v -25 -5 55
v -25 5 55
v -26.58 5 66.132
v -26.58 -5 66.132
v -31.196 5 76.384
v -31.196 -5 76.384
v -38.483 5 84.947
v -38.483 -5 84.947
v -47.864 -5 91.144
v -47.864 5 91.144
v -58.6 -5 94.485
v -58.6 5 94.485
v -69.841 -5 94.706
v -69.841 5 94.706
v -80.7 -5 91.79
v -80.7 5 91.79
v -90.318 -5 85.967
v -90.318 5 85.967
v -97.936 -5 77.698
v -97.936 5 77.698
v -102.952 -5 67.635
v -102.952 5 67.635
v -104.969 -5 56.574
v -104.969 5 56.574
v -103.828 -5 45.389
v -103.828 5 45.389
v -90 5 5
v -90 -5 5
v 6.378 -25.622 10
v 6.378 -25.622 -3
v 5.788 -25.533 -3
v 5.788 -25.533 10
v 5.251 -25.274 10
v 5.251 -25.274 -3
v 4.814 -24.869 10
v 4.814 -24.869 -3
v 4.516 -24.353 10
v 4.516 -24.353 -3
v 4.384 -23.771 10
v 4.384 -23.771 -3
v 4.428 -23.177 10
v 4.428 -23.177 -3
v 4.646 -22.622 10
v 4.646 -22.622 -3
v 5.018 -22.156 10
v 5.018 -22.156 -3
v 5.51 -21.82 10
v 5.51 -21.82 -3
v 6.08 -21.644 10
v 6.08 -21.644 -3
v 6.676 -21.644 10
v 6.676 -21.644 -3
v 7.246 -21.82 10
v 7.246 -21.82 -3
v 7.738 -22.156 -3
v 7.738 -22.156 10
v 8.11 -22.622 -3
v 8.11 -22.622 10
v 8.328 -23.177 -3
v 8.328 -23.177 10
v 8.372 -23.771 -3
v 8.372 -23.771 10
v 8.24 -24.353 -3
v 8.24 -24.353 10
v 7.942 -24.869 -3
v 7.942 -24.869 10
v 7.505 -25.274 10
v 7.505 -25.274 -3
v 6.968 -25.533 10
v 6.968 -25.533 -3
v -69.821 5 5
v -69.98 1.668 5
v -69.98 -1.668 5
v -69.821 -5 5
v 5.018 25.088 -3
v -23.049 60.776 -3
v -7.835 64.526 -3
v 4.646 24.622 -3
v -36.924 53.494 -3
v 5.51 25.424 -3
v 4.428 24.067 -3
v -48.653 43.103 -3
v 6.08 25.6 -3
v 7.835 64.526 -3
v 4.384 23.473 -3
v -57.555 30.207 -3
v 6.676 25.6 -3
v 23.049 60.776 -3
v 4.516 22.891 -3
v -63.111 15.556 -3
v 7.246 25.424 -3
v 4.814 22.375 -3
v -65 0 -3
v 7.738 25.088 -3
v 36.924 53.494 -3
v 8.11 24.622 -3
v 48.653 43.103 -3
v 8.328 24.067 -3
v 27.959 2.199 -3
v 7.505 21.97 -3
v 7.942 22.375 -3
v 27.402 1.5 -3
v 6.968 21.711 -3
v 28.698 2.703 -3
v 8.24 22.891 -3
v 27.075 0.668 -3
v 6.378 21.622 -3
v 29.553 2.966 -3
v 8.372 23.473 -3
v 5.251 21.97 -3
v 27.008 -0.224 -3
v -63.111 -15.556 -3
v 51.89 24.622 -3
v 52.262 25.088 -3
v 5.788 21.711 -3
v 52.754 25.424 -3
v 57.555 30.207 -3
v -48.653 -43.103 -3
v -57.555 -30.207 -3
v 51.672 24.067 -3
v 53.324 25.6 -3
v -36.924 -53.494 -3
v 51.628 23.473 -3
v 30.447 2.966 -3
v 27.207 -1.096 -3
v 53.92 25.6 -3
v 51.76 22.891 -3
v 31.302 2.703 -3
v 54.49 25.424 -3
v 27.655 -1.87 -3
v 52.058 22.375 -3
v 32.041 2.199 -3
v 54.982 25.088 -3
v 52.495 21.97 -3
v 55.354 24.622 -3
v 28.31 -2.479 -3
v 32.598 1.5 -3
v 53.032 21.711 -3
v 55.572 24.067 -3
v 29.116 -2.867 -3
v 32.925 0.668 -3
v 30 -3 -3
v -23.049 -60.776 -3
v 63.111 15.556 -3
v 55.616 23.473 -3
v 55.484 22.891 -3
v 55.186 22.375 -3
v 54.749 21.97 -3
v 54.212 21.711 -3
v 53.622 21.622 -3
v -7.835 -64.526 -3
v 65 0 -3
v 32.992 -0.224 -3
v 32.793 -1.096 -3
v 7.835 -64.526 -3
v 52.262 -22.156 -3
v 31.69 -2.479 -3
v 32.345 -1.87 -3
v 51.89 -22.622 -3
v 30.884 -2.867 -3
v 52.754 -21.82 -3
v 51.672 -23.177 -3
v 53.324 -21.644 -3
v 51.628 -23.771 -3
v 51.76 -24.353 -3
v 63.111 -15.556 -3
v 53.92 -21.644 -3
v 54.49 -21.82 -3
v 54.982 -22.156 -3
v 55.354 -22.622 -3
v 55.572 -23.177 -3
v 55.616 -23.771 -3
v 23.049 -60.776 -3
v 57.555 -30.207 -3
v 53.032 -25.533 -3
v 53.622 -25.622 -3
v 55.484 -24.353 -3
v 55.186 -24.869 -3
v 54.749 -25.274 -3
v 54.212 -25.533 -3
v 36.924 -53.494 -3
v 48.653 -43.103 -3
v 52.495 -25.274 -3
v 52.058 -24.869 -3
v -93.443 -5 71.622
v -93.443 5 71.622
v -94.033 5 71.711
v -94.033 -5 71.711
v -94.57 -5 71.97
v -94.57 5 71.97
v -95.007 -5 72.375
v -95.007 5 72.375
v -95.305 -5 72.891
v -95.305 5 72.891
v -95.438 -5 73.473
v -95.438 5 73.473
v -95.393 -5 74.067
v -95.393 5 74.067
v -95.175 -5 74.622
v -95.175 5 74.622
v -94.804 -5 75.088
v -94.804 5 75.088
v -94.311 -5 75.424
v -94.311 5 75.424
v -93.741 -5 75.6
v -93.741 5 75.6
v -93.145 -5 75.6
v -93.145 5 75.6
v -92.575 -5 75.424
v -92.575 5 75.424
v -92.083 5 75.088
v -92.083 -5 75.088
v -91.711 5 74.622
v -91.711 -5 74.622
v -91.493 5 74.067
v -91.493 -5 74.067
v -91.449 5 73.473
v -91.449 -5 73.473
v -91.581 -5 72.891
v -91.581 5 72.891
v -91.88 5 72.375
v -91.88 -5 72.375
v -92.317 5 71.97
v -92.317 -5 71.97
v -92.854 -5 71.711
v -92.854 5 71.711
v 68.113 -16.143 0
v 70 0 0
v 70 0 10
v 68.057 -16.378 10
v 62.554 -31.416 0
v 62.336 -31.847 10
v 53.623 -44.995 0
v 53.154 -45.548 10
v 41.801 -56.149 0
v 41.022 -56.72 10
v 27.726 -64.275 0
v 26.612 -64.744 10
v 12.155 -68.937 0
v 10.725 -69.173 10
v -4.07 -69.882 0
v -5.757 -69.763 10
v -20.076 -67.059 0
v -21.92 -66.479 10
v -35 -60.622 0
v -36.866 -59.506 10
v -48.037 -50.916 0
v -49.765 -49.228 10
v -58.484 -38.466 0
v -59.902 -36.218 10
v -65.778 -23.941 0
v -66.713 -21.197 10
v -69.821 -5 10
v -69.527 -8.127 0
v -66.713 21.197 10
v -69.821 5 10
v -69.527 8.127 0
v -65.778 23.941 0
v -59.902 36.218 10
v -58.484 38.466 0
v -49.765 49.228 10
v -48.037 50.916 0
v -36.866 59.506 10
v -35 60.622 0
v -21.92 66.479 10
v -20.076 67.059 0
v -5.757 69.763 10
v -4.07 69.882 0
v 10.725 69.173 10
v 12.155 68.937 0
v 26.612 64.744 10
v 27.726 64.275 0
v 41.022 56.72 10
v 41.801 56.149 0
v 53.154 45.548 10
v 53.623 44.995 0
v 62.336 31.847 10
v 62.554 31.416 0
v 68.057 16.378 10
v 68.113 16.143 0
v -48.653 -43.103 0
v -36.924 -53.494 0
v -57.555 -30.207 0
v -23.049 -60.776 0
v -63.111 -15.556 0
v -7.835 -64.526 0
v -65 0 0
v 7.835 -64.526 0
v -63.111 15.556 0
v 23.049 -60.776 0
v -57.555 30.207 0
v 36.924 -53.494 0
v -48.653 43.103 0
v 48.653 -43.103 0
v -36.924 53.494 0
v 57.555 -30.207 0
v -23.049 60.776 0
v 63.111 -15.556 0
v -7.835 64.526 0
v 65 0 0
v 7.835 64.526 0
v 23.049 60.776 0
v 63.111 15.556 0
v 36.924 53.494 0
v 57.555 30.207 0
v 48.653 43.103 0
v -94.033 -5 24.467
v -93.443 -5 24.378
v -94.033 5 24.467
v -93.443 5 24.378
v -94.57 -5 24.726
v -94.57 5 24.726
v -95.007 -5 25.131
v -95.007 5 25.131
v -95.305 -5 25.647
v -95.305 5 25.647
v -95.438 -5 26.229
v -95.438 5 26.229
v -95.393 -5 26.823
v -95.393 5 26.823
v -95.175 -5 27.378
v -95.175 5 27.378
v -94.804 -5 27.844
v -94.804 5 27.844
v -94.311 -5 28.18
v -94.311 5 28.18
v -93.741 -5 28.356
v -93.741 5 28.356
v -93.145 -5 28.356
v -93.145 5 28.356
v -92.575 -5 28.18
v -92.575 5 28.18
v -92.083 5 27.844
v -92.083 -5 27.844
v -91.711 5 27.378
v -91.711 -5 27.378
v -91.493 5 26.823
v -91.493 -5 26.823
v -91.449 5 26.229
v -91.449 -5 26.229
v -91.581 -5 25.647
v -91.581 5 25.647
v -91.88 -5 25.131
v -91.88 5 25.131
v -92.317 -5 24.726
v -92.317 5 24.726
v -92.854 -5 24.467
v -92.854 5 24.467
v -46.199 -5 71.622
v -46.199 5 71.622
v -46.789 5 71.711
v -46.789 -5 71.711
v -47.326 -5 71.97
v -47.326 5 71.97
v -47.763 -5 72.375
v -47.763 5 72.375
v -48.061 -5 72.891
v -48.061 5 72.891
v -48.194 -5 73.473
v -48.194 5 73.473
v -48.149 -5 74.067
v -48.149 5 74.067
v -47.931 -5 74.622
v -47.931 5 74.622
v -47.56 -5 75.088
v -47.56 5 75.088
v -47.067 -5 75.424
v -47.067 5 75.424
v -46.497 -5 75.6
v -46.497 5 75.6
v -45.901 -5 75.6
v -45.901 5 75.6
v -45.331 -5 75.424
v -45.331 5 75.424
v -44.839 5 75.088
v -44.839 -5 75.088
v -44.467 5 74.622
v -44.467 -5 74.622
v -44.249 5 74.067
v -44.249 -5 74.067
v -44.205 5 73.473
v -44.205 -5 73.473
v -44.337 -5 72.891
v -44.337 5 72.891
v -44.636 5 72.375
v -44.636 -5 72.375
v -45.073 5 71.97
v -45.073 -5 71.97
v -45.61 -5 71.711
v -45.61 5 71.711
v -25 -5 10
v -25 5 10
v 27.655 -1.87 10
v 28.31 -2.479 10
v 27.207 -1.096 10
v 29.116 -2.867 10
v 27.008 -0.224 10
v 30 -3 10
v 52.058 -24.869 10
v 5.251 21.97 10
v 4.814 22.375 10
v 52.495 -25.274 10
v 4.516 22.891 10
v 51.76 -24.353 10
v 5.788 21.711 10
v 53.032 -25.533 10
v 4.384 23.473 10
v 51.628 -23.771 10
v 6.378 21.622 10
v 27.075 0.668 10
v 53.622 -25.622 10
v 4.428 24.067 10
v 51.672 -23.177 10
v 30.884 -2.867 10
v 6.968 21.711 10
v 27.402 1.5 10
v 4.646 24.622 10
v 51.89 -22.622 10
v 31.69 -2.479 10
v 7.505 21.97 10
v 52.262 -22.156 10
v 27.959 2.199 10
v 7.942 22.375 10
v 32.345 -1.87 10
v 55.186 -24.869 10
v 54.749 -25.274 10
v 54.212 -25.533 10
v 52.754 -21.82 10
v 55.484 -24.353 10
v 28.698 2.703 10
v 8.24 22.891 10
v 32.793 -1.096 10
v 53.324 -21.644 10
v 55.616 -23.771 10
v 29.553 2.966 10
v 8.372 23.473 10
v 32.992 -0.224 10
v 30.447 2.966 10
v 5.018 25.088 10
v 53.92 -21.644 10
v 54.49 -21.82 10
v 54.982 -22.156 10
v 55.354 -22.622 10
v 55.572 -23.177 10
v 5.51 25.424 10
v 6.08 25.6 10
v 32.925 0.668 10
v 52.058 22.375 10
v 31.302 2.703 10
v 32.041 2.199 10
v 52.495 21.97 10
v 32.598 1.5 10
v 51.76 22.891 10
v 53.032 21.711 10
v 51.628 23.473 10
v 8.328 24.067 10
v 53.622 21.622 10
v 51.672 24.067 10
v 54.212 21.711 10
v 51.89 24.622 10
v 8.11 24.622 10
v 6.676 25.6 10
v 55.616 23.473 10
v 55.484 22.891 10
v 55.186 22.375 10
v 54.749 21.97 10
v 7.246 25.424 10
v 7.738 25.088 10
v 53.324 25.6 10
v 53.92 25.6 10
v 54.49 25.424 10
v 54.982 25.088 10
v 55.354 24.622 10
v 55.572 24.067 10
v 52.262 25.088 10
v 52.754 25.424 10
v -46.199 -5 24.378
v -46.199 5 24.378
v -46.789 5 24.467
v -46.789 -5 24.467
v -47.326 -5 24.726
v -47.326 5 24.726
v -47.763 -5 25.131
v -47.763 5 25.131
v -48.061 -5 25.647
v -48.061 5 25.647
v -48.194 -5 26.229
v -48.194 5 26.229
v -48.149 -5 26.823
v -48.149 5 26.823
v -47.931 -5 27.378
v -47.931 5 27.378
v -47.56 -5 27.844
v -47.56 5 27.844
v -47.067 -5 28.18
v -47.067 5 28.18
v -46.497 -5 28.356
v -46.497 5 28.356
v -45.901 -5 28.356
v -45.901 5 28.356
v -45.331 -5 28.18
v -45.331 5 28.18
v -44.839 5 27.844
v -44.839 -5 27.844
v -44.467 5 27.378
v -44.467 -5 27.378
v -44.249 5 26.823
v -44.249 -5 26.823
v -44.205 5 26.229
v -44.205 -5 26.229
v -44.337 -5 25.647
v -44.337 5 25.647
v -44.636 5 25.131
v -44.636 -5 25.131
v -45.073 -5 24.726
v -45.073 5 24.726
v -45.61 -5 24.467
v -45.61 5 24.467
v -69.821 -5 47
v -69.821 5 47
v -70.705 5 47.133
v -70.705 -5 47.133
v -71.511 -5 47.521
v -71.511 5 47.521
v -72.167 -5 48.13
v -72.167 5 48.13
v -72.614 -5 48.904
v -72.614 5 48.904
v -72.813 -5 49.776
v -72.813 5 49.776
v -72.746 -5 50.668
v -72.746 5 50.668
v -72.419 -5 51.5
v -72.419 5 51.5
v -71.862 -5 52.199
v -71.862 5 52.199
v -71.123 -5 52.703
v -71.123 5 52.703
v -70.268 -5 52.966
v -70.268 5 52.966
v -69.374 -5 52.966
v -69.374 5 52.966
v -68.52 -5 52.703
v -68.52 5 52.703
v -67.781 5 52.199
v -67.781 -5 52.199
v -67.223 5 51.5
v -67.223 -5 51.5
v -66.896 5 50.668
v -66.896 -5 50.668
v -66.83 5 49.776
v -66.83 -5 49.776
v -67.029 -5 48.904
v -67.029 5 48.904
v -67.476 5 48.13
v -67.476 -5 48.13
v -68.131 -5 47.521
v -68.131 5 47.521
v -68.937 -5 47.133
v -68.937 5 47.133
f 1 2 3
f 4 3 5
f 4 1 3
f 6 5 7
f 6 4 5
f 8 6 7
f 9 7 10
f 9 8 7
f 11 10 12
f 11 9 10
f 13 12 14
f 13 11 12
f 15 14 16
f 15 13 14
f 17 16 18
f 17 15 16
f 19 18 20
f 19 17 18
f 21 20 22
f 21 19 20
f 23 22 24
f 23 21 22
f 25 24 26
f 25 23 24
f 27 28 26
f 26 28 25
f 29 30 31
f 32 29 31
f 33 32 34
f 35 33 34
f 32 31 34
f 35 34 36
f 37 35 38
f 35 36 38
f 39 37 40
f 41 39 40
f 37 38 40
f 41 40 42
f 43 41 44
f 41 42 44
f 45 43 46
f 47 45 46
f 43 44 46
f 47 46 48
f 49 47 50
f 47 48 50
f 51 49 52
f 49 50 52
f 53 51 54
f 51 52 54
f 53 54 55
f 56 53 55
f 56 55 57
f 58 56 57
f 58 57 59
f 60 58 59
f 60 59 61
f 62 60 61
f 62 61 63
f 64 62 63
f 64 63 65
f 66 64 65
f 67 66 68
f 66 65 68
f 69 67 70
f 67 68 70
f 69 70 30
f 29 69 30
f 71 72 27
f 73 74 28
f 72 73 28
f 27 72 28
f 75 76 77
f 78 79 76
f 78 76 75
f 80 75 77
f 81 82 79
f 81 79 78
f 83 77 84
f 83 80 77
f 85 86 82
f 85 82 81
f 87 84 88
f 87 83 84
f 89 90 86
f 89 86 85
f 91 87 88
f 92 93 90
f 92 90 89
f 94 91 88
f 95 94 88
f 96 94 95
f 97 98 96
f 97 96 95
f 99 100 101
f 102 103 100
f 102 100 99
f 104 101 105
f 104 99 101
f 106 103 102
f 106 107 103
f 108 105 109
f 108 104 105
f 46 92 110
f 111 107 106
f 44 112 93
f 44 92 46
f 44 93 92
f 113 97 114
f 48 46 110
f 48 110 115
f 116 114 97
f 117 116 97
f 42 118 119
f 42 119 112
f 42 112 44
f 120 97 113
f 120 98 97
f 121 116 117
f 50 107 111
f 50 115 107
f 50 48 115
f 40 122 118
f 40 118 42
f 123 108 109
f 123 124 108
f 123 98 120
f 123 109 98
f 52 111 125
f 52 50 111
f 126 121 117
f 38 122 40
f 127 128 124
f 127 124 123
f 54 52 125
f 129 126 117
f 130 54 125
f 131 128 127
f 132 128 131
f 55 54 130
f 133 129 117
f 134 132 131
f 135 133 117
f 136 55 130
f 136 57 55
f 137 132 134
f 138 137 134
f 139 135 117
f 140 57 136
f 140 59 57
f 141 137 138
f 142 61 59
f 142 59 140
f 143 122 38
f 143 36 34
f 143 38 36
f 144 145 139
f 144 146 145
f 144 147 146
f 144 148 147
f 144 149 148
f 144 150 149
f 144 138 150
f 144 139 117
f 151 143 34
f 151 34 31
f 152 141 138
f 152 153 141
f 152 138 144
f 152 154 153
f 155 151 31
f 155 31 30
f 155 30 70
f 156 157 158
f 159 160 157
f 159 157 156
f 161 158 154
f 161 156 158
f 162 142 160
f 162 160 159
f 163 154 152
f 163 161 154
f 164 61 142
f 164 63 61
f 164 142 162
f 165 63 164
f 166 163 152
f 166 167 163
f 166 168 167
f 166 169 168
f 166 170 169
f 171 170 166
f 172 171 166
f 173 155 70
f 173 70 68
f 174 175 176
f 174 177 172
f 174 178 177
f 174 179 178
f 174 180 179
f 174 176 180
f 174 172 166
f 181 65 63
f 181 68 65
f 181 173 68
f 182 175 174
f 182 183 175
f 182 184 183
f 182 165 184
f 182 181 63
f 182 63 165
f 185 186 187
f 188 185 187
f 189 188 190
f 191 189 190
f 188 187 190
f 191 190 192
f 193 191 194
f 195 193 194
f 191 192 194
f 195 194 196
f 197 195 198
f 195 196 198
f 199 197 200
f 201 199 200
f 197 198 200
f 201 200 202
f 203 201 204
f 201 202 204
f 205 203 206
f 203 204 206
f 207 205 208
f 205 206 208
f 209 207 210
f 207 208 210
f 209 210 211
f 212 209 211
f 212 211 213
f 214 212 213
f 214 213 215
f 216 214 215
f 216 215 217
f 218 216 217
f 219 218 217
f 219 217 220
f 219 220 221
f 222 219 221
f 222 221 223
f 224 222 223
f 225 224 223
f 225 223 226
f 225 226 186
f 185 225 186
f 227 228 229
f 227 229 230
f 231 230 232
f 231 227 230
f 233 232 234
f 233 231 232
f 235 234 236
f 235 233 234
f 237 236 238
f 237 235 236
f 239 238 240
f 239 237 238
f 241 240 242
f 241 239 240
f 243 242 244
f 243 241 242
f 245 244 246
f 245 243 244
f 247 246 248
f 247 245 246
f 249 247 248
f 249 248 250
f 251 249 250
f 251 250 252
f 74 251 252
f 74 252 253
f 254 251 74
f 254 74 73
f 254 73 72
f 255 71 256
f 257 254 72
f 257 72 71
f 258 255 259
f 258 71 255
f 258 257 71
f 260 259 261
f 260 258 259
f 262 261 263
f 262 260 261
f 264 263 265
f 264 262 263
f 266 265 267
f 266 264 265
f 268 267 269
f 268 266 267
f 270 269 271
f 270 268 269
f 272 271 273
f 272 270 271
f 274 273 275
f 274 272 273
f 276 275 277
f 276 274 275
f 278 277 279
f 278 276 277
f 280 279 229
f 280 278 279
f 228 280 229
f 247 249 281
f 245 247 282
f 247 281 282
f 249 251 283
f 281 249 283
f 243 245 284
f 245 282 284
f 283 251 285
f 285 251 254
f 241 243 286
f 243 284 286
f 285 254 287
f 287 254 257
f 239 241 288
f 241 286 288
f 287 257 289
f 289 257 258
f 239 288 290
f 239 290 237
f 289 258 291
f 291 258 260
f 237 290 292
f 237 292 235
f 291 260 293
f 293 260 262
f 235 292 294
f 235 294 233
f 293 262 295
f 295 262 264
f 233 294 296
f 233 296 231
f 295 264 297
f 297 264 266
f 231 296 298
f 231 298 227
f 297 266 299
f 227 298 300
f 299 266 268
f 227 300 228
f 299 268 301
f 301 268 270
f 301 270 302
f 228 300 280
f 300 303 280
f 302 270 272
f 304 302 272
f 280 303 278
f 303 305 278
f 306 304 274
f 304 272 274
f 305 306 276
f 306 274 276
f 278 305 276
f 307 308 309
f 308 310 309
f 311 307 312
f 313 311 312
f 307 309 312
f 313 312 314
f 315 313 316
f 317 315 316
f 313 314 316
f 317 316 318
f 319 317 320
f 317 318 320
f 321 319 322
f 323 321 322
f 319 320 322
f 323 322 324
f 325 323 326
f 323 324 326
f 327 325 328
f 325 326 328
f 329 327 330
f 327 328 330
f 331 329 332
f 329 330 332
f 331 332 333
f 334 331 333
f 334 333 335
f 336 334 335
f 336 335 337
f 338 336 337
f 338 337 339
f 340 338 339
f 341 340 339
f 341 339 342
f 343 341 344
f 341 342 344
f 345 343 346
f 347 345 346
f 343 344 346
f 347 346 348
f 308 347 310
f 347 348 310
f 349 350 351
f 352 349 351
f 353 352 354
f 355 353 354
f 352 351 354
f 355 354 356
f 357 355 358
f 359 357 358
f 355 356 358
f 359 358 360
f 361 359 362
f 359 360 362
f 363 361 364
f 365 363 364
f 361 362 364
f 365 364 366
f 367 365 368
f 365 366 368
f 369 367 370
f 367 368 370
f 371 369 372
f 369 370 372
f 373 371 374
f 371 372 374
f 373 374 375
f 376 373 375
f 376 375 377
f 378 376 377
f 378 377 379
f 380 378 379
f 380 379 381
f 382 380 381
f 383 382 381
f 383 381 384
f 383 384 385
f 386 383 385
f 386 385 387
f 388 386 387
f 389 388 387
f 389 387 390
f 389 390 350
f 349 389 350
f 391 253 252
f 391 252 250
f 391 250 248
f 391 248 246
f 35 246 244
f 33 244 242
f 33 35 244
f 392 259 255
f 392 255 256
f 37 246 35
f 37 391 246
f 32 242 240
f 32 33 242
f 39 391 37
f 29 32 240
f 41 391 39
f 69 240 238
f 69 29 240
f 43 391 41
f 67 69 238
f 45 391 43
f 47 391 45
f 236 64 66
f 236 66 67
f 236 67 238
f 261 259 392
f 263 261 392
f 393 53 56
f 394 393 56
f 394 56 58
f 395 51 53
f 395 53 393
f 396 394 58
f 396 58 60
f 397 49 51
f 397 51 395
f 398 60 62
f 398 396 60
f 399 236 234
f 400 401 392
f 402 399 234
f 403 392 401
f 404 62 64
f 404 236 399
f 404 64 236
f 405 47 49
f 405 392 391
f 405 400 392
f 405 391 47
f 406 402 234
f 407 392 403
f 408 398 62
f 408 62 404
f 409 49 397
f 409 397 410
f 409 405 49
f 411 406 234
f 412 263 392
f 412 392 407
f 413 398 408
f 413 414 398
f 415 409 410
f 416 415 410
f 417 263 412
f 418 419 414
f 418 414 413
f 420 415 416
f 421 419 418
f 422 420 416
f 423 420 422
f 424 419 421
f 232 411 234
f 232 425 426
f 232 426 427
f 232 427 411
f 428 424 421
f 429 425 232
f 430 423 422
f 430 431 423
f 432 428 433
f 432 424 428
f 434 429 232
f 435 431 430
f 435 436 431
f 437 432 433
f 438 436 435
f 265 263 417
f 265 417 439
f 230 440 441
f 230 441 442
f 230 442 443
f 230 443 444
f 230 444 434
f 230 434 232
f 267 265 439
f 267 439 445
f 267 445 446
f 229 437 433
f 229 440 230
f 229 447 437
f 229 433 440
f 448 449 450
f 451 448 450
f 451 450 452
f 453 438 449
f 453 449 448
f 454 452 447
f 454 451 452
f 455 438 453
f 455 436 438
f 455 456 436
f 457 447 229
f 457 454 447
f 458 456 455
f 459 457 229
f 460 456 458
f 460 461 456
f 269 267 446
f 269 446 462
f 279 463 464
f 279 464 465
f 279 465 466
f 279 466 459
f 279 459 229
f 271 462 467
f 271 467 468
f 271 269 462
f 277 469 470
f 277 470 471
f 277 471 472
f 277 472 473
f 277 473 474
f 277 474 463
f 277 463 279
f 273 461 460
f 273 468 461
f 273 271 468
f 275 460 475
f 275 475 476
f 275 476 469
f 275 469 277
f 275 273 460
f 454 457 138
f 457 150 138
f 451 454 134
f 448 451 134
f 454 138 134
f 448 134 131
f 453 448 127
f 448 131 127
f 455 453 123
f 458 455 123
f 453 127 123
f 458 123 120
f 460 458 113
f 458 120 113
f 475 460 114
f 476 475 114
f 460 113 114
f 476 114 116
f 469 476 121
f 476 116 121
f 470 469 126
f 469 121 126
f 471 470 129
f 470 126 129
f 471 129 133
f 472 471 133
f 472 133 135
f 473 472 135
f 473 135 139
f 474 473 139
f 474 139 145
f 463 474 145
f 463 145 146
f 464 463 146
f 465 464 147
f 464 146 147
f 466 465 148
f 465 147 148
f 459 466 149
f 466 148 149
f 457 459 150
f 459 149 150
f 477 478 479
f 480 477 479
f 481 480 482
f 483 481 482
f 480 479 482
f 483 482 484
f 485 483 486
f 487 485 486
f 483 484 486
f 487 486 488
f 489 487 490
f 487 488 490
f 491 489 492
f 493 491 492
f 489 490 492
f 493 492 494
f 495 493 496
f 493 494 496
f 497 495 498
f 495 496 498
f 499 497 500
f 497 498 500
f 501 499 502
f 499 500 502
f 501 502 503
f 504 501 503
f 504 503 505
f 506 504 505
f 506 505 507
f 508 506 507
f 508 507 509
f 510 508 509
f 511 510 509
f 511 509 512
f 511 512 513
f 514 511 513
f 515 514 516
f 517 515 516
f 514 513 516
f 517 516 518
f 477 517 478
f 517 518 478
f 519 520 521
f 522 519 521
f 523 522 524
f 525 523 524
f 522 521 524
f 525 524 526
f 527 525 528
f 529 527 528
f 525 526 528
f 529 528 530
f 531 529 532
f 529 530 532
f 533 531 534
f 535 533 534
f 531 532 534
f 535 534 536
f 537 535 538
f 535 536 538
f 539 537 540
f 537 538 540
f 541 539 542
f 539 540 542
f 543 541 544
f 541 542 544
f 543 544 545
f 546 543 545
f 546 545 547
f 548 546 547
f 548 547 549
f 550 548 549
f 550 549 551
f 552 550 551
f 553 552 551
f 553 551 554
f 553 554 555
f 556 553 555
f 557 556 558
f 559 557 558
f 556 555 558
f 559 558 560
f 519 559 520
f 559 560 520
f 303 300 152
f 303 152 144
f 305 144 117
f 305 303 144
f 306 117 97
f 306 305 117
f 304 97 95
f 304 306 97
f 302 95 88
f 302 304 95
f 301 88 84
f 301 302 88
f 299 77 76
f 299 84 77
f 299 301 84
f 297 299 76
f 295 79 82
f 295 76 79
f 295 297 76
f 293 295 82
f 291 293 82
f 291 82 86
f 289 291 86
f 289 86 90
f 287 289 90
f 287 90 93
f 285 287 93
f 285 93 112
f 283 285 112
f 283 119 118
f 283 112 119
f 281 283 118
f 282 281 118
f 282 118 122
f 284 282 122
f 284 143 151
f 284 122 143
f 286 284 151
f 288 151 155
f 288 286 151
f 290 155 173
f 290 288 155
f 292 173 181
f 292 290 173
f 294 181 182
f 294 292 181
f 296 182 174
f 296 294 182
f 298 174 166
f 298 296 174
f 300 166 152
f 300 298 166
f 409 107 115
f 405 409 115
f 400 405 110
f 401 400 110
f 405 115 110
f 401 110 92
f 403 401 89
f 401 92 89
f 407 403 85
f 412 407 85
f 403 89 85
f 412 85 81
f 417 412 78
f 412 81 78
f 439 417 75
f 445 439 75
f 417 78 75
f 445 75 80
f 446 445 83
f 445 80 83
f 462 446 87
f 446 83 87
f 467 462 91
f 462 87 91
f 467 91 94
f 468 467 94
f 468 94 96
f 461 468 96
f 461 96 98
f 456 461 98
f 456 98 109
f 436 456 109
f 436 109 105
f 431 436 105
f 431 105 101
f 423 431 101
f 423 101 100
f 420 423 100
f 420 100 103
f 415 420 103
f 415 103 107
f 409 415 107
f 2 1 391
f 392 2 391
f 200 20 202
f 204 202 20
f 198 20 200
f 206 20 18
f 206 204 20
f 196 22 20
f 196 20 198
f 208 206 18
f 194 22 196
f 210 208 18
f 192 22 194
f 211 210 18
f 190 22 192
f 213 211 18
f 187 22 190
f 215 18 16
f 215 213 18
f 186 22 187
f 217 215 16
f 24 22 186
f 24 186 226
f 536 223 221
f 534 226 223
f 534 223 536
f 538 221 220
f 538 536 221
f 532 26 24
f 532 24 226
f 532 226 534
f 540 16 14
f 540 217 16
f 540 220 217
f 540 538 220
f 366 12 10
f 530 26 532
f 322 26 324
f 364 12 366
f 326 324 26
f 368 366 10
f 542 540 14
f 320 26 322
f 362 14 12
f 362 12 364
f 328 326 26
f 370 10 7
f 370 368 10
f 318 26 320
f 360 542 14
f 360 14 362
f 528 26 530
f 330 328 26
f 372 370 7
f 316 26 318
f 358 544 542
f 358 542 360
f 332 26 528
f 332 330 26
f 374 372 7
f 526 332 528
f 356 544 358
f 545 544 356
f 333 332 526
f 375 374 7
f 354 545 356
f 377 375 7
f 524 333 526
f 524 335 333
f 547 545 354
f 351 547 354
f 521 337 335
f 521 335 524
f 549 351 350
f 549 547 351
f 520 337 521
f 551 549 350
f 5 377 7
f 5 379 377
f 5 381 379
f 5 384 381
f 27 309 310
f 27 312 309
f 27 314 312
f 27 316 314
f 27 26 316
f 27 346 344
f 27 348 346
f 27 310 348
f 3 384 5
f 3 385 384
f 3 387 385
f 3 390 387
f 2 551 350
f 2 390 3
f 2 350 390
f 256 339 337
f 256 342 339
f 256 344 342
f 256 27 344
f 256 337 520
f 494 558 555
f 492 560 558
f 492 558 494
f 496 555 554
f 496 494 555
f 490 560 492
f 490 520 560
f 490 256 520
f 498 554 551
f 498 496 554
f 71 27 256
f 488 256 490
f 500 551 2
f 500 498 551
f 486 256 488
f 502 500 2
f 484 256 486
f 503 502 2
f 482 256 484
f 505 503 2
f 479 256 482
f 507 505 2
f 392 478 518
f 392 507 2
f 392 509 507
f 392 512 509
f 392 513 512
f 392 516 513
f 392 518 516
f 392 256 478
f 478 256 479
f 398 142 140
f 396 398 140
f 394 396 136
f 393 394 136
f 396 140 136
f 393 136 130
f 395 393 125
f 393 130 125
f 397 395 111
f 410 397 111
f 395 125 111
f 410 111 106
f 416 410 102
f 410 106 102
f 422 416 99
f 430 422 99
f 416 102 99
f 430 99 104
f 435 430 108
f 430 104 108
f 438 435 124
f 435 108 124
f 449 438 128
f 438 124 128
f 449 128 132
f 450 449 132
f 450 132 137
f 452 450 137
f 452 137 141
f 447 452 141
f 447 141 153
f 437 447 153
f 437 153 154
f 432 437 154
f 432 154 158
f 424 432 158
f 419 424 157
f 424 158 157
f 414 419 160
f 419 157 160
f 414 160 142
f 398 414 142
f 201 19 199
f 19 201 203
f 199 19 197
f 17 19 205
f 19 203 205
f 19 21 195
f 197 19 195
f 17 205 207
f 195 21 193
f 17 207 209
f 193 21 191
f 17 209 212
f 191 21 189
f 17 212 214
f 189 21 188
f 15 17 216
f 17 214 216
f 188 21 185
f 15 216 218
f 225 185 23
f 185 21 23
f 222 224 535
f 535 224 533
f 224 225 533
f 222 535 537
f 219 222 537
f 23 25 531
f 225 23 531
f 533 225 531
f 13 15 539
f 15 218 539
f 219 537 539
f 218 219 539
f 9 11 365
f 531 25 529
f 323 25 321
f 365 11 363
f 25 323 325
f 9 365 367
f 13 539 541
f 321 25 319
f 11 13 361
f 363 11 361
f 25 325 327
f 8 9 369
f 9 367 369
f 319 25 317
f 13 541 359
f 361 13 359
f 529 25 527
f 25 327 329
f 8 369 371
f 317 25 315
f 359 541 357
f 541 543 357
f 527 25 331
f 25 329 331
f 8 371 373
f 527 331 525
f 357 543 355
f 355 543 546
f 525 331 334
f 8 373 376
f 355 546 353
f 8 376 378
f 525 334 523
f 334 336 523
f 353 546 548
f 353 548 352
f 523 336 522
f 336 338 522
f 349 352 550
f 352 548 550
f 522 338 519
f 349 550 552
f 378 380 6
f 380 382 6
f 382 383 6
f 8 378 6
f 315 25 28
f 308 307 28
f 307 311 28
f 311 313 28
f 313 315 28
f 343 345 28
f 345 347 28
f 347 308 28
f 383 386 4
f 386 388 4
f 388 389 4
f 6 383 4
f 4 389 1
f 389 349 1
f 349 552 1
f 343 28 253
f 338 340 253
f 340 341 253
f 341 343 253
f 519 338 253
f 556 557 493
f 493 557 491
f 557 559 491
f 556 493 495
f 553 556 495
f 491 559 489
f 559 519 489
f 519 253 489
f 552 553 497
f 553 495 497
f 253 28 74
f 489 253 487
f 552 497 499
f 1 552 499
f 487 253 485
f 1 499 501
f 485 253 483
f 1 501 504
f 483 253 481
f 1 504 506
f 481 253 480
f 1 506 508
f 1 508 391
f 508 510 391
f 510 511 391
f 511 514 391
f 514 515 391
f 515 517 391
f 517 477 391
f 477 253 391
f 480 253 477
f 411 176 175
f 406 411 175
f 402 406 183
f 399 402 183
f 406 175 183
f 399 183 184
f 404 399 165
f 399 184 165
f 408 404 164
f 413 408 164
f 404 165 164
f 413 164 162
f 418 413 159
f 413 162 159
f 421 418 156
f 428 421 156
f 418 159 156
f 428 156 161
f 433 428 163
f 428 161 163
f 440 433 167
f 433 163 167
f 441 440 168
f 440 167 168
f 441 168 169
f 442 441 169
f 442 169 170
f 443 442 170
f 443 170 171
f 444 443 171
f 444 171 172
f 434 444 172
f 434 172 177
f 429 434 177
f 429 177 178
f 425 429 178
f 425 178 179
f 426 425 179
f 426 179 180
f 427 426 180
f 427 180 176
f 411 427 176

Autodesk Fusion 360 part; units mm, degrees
sketch "Sketch1" plane through (0, 0, 0) normal (0, 0, 1) x (1, 0, 0)
  circle A0 centre (0, 0) radius 70
  dimension "d1" = 140
extrude "Extrude1" add sketch "Sketch1" along normal blind 10
sketch "Sketch2" plane through (0, 0, 0) normal (0, 0, -1) x (1, 0, 0)
  circle A0 centre (0, 0) radius 70
  circle A1 centre (0, 0) radius 65
  dimension "d4" = -5
extrude "Extrude2" add sketch "Sketch2" along normal blind 3 contours A1
sketch "Sketch3" plane through (0, 0, 0) normal (0, 1, 0) x (1, 0, 0)
  line L0 (-25, -55) -> (-25, -5)
  line L1 (-25, -5) -> (-90, -5)
  line L2 (-90, -5) -> (-103.8281, -45.3888)
  arc A0 (-103.8281, -45.3888) -> (-25, -55) centre (-65, -55) ccw
  dimension "d7" = 50
  dimension "d8" = 65
  dimension "d9" = 40
  dimension "d12" = 5
  dimension "d14" = 25
extrude "Extrude3" add sketch "Sketch3" along normal mid plane 10
sketch "Sketch4" plane through (0, 0, 10) normal (0, 0, 1) x (-1, 0, 0)
  line L0 (69.8212, -5) -> (25, -5)
  line L1 (25, -5) -> (25, 5)
  line L2 (25, 5) -> (69.8212, 5)
  arc A0 (69.8212, 5) -> (69.8212, -5) centre (0, 0) ccw
  line L3 (-6.378, 23.622) -> (-53.622, 23.622)
  line L4 (-53.622, 23.622) -> (-53.622, -23.622)
  line L5 (-53.622, -23.622) -> (-6.378, -23.622)
  line L6 (-6.378, -23.622) -> (-6.378, 23.622)
  line L7 (-6.378, 23.622) -> (-53.622, -23.622) construction
  line L8 (-53.622, 23.622) -> (-6.378, -23.622) construction
  point P0 (-30, 0)
  dimension "d17" = 47.244
  dimension "d18" = 47.244
  dimension "d20" = 30
hole "Hole1" at (6.378, 23.622, 10) at (53.622, 23.622, 10) at (53.622, -23.622, 10) at (6.378, -23.622, 10) direction (0, 0, -1) diameter 4 depth 15 tip angle 118
hole "Hole2" at (30, 0, 10) direction (0, 0, -1) diameter 6 depth 15 tip angle 118
sketch "Sketch5" plane through (0, -5, 0) normal (0, -1, 0) x (1, 0, 0)
  line L0 (-69.8212, 10) -> (-25, 10)
  line L1 (-25, 10) -> (-25, 55)
  arc A0 (-25, 55) -> (-103.8281, 45.3888) centre (-65, 55) ccw
  line L2 (-103.8281, 45.3888) -> (-90, 5)
  line L3 (-90, 5) -> (-69.8212, 5)
  line L4 (-69.8212, 5) -> (-69.8212, 10)
  line L5 (-93.4432, 73.622) -> (-46.1992, 73.622)
  line L6 (-46.1992, 73.622) -> (-46.1992, 26.378)
  line L7 (-46.1992, 26.378) -> (-93.4432, 26.378)
  line L8 (-93.4432, 26.378) -> (-93.4432, 73.622)
  line L9 (-93.4432, 73.622) -> (-46.1992, 26.378) construction
  line L10 (-46.1992, 73.622) -> (-93.4432, 26.378) construction
  point P0 (-69.8212, 50)
  dimension "d27" = 47.244
  dimension "d28" = 47.244
  dimension "d30" = 45
hole "Hole3" at (-93.4432, -5, 73.622) at (-46.1992, -5, 73.622) at (-93.4432, -5, 26.378) at (-46.1992, -5, 26.378) direction (0, 1, 0) diameter 4 depth 15 tip angle 118
hole "Hole4" at (-69.8212, -5, 50) direction (0, 1, 0) diameter 6 depth 15 tip angle 118
